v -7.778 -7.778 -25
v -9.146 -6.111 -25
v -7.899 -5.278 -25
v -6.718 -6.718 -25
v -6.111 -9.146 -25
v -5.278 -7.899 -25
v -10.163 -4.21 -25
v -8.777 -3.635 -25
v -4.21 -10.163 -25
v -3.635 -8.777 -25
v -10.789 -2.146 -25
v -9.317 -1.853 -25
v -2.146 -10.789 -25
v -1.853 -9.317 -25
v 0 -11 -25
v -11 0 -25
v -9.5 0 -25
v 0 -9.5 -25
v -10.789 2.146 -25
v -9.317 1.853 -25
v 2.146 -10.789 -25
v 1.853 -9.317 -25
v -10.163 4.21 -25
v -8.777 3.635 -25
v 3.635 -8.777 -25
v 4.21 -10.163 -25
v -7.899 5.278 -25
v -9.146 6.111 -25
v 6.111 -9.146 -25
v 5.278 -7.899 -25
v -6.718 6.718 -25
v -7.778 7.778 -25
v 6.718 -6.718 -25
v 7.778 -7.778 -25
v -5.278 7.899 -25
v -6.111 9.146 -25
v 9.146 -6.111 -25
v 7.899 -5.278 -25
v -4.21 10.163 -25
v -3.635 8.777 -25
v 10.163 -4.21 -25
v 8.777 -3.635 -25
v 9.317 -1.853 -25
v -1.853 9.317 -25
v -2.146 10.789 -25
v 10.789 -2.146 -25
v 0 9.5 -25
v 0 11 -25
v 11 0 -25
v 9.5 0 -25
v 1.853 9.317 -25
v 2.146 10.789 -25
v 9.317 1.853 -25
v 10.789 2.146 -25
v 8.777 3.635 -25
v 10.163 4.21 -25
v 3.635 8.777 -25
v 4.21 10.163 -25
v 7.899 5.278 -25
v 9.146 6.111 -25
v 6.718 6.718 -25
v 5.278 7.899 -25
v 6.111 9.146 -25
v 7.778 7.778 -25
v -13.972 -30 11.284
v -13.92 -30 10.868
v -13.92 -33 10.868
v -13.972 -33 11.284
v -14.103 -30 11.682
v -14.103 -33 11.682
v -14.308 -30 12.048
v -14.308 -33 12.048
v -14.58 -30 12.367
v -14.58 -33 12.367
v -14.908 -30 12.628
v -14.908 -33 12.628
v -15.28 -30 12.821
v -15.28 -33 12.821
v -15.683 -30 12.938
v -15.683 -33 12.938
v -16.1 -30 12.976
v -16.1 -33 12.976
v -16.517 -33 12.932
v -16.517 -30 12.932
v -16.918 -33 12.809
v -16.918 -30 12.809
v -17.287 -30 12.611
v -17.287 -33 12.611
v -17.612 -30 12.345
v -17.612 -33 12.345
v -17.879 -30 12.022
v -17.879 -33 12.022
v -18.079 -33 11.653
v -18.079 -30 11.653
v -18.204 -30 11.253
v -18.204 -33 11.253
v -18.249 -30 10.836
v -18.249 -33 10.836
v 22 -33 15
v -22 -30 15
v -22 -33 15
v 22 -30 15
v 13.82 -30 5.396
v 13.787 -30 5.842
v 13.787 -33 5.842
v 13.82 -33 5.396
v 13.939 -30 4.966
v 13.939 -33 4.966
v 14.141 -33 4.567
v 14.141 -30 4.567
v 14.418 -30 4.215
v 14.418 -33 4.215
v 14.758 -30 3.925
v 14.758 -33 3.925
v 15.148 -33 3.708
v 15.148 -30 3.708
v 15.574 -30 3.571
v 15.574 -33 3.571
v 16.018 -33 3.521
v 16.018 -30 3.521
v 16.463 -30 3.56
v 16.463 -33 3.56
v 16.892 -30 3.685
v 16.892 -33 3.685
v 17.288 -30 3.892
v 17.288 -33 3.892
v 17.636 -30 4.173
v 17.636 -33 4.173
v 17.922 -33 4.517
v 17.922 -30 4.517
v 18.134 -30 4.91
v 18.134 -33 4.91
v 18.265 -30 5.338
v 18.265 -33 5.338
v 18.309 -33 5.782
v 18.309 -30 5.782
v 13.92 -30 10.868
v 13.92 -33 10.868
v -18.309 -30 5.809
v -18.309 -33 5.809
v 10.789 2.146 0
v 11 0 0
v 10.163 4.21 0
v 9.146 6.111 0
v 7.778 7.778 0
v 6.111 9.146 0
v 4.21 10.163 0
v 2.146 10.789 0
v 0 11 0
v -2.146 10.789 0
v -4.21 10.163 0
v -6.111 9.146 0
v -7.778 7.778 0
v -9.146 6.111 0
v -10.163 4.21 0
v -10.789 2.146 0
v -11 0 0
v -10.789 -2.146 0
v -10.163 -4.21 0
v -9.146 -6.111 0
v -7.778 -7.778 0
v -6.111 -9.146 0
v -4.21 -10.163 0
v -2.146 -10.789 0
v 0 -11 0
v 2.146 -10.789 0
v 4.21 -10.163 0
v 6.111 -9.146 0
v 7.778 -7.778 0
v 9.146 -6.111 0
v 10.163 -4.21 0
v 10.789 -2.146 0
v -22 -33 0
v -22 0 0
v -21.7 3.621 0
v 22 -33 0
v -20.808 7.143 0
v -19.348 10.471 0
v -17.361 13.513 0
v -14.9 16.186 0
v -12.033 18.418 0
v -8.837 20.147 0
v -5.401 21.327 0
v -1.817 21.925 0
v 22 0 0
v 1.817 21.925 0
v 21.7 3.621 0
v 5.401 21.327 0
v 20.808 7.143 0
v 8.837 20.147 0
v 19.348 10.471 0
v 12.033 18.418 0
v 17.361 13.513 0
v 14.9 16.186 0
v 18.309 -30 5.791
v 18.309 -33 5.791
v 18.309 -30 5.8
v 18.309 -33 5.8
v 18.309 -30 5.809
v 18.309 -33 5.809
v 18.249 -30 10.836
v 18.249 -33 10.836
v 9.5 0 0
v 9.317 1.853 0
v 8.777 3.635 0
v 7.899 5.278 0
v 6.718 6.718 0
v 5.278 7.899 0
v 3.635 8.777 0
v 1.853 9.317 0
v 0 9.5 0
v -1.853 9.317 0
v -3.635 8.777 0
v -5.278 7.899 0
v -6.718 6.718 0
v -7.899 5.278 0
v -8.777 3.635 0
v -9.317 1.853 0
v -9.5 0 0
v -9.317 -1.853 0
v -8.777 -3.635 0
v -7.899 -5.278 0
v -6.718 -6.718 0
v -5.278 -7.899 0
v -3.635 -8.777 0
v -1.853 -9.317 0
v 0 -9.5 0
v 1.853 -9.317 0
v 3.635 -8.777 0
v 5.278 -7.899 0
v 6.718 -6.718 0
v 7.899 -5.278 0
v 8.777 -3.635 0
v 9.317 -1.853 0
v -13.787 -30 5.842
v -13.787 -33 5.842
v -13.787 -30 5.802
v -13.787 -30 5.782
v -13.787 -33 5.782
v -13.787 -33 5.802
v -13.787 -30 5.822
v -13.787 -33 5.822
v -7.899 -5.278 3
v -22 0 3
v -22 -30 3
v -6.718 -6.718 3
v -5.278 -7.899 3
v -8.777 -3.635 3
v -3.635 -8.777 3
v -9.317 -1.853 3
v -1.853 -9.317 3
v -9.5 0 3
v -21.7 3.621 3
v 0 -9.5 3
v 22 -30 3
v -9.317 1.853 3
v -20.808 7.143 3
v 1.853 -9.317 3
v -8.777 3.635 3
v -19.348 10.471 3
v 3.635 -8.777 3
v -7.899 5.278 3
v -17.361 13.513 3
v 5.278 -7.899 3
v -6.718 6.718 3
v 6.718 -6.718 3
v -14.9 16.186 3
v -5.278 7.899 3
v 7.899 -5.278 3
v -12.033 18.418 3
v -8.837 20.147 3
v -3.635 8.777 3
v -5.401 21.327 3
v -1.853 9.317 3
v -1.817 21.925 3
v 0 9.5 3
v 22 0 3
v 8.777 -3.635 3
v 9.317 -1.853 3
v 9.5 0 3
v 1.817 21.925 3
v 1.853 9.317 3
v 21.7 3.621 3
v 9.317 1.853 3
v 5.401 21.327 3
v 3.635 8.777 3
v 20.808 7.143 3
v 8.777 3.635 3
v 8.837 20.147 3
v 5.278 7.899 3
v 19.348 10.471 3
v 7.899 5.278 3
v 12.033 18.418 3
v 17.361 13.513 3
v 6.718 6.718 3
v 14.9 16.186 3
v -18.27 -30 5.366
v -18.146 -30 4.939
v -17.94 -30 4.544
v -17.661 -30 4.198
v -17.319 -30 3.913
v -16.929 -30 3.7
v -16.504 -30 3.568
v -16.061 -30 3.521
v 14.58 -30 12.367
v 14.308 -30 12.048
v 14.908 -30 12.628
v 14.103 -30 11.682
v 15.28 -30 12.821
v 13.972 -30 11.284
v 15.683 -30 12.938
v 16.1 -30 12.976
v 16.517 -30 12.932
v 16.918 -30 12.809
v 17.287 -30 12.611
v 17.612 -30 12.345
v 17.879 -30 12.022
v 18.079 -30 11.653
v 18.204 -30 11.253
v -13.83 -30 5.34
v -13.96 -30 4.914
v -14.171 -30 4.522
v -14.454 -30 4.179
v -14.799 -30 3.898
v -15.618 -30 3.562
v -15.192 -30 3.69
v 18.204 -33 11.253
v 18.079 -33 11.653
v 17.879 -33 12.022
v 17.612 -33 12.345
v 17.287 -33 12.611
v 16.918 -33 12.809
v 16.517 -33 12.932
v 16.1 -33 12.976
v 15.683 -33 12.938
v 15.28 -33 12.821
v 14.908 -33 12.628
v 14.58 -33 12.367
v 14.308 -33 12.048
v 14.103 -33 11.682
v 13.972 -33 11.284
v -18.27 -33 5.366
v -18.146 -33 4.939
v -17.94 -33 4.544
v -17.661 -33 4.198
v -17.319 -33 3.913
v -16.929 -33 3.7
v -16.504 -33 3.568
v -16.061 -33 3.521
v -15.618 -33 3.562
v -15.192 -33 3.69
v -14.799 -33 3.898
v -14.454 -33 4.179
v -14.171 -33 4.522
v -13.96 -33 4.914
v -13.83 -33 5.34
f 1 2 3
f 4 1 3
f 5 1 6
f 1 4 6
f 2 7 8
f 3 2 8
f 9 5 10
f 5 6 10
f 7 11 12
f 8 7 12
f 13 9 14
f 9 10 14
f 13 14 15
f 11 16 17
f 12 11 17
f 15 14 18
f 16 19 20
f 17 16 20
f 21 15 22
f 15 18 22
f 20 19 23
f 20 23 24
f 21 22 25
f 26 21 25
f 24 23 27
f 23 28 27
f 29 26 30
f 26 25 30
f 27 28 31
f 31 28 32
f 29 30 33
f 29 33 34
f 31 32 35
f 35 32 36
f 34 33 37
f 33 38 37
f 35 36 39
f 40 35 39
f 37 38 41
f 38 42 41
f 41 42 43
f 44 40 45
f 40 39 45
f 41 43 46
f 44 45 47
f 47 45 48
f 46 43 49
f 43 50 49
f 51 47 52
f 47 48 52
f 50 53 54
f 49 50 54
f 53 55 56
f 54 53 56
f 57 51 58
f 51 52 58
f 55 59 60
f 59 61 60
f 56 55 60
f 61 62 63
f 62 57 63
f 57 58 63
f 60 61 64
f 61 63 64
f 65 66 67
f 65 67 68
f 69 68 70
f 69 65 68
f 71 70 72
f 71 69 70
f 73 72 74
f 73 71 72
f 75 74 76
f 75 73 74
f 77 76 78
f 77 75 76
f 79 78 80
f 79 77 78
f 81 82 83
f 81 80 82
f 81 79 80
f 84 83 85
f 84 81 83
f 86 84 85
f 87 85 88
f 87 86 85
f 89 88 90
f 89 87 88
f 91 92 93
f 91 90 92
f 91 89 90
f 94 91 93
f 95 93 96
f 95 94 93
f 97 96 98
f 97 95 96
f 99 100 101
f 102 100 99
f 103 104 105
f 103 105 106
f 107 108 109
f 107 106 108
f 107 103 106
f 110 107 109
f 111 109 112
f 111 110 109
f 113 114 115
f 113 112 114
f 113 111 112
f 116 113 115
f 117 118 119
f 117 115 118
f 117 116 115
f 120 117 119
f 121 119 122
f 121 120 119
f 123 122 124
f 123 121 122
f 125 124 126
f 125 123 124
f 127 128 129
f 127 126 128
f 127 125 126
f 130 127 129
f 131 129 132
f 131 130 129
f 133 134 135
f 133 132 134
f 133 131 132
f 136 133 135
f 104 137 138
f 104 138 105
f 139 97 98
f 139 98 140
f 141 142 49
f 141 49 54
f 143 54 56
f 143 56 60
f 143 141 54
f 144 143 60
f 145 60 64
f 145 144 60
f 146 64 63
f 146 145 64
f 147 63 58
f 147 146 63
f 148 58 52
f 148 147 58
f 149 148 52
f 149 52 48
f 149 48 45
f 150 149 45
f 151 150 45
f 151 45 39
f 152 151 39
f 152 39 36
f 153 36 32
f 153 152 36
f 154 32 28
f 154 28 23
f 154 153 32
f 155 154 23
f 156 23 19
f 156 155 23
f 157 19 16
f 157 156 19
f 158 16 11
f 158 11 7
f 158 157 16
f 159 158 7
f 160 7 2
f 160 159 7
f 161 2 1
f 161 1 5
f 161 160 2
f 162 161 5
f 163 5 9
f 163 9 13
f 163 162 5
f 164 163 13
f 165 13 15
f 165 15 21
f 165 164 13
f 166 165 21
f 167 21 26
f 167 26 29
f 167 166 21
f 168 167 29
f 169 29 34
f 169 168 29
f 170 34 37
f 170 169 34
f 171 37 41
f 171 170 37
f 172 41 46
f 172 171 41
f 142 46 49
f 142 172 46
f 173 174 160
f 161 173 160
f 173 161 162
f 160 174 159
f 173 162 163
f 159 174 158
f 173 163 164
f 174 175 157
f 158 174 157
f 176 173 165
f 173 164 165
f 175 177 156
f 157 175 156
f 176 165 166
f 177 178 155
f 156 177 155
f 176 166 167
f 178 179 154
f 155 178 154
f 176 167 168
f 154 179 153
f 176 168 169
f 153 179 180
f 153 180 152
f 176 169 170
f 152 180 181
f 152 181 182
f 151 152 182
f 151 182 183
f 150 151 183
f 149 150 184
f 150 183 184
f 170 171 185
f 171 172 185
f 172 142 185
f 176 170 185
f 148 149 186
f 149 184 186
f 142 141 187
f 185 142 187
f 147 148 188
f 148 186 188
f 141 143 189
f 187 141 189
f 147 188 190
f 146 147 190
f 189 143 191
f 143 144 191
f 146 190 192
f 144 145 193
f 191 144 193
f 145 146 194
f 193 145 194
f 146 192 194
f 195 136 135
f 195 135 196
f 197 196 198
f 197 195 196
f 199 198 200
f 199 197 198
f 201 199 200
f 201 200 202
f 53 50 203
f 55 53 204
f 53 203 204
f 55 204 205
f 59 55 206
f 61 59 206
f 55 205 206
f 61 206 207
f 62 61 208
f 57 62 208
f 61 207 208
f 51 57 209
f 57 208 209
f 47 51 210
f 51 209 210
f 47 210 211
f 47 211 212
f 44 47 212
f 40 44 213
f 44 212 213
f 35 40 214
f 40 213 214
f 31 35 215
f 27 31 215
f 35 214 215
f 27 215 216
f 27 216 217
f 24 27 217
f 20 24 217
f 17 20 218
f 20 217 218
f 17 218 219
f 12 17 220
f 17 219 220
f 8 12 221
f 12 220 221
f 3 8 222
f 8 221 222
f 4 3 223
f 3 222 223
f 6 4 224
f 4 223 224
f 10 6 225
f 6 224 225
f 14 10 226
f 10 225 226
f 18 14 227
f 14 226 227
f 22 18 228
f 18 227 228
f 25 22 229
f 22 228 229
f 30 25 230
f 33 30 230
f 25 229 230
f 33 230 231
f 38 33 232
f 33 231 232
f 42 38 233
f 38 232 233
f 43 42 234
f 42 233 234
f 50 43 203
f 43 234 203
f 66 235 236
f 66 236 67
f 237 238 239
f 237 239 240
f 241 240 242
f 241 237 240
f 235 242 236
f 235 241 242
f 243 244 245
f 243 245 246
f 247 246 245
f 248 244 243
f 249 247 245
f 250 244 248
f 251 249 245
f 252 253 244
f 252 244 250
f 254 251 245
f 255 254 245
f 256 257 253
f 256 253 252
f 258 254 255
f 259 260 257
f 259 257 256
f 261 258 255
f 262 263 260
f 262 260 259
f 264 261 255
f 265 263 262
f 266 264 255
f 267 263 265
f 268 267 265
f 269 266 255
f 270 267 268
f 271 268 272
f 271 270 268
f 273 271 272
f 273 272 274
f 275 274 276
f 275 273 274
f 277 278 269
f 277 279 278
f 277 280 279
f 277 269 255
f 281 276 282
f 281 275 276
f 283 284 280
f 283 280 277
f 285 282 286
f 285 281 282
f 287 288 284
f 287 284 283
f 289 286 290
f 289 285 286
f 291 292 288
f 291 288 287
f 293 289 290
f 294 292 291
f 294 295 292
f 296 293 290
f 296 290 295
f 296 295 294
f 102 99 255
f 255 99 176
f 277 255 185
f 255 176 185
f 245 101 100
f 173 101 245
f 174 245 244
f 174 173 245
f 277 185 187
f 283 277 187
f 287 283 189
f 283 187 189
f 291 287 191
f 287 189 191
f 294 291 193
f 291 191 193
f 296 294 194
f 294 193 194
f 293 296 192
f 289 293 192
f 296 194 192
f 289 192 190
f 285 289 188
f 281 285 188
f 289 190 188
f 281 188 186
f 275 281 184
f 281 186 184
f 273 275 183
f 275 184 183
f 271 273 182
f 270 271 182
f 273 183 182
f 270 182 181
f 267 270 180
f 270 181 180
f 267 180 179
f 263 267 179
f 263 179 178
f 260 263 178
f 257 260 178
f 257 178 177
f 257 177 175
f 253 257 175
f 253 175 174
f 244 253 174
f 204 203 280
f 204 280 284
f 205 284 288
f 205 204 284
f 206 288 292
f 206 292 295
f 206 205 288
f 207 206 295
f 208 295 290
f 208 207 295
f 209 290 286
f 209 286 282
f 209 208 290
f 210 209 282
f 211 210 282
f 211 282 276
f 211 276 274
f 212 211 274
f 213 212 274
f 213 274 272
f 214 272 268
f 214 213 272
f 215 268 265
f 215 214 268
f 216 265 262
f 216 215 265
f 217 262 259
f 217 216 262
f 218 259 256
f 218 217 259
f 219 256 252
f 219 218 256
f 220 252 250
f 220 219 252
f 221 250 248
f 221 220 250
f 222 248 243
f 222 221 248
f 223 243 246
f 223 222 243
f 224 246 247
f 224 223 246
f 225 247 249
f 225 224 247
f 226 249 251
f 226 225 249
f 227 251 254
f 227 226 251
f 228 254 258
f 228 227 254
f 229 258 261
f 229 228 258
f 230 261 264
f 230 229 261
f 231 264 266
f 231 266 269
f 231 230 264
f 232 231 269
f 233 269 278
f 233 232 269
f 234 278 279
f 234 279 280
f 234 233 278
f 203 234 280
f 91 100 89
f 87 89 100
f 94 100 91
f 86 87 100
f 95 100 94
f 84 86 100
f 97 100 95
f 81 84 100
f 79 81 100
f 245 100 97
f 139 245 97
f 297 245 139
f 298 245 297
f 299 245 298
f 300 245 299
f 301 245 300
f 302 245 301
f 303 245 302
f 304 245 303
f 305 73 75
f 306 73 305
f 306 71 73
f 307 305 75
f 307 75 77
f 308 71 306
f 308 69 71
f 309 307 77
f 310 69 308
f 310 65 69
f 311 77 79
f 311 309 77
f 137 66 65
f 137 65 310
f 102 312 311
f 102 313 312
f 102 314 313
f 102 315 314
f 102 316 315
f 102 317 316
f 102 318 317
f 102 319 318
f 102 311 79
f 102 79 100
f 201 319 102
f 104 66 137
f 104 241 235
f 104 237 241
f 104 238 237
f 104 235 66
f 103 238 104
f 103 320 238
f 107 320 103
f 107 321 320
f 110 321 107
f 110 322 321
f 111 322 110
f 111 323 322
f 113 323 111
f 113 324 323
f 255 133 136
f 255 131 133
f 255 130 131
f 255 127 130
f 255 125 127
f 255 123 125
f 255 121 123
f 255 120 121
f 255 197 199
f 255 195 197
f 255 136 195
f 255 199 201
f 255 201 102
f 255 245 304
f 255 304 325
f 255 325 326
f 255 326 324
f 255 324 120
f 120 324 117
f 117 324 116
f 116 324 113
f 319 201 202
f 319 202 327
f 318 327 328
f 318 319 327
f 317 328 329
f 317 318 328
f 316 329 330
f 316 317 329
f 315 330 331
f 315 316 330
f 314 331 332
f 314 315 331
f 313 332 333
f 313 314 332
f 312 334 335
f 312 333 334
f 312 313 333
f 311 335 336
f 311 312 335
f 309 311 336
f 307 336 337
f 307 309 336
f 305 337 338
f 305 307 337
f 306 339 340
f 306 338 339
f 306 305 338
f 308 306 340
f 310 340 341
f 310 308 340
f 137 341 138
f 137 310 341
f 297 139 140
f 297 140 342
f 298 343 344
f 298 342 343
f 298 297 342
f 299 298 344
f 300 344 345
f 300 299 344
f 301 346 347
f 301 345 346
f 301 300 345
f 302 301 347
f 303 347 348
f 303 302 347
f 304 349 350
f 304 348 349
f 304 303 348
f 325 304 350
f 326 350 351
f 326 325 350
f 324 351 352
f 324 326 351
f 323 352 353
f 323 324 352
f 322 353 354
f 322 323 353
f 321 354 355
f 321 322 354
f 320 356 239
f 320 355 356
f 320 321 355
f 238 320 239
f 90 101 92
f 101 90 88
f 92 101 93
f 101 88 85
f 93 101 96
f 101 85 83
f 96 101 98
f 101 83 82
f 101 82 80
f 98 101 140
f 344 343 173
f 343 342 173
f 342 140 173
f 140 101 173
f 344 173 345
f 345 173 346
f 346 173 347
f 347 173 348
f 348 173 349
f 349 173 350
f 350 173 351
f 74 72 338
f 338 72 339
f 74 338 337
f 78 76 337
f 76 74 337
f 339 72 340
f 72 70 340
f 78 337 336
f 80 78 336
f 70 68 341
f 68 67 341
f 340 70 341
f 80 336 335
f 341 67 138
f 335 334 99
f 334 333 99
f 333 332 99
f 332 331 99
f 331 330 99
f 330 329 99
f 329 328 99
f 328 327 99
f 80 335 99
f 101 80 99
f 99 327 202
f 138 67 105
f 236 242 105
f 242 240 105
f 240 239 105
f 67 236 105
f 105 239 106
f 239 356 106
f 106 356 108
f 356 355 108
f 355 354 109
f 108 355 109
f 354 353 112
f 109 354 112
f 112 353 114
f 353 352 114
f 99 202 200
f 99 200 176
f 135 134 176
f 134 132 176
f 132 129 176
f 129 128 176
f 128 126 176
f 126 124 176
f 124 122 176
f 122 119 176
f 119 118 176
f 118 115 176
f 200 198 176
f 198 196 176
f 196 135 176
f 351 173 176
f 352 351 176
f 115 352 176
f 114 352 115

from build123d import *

# Parameters (mm, degrees)
F0_R     = 11
F0_R_2   = 9.5
F1_DEPTH = 3
F0_W     = 44
F0_H     = 3
F2_DEPTH = 15
F3_DEPTH = 25
F5_DEPTH = 50


with BuildPart() as f1:
    # F0 (on Top) → F1 (new body)
    with BuildSketch(Plane.XY):
        with BuildLine():
            Line((22, -30), (22, 0))
            ThreePointArc((22, 0), (0, -22), (-22, 0))
            Line((-22, 0), (-22, -30))
            Line((-22, -30), (22, -30))
        make_face()
        with BuildLine():
            ThreePointArc((-22, 0), (0, -22), (22, 0))
            ThreePointArc((22, 0), (0, 22), (-22, 0))
        make_face()
        Circle(F0_R, mode=Mode.SUBTRACT)
        Circle(F0_R)
        Circle(F0_R_2, mode=Mode.SUBTRACT)
    extrude(amount=F1_DEPTH)

    # F0 (on Top) → F2 (join)
    with BuildSketch(Plane.XY):
        with Locations((0, -31.5)):
            Rectangle(F0_W, F0_H)
    extrude(amount=F2_DEPTH)

    # F0 (on Top) → F3 (join)
    with BuildSketch(Plane.XY):
        Circle(F0_R)
        Circle(F0_R_2, mode=Mode.SUBTRACT)
    extrude(amount=-F3_DEPTH)

    # F4 (on Front) → F5 (cut)
    with BuildSketch(Plane.XZ):
        with BuildLine():
            ThreePointArc((-18.249251, 10.8364), (-16.097239, 8.645825), (-13.919441, 10.810768))
            ThreePointArc((-13.919441, 10.810768), (-13.91963, 10.839348), (-13.920196, 10.867923))
            ThreePointArc((-13.920196, 10.867923), (-16.100186, 12.975691), (-18.249251, 10.8364))
        make_face()
        with BuildLine():
            ThreePointArc((-13.920196, 10.867923), (-13.91963, 10.839348), (-13.919441, 10.810768))
            ThreePointArc((-13.919441, 10.810768), (-16.097239, 8.645825), (-18.249251, 10.8364))
            Line((-18.249251, 10.8364), (-18.308776, 5.809141))
            ThreePointArc((-18.308776, 5.809141), (-16.064272, 8.043438), (-13.787468, 5.842063))
            Line((-13.787468, 5.842063), (-13.920196, 10.867923))
        make_face()
        with BuildLine():
            ThreePointArc((-13.78668, 5.78237), (-13.786877, 5.812219), (-13.787468, 5.842063))
            ThreePointArc((-13.787468, 5.842063), (-16.064272, 8.043438), (-18.308776, 5.809141))
            ThreePointArc((-18.308776, 5.809141), (-16.061193, 3.521282), (-13.78668, 5.78237))
        make_face()
        with BuildLine():
            ThreePointArc((18.249403, 10.810768), (16.055842, 8.645976), (13.920196, 10.867923))
            Line((13.920196, 10.867923), (13.787468, 5.842063))
            ThreePointArc((13.787468, 5.842063), (16.064272, 8.043438), (18.308776, 5.809141))
            Line((18.308776, 5.809141), (18.249251, 10.8364))
            ThreePointArc((18.249251, 10.8364), (18.249365, 10.823584), (18.249403, 10.810768))
        make_face()
        with BuildLine():
            ThreePointArc((18.249251, 10.8364), (16.100186, 12.975691), (13.920196, 10.867923))
            ThreePointArc((13.920196, 10.867923), (16.055842, 8.645976), (18.249403, 10.810768))
            ThreePointArc((18.249403, 10.810768), (18.249365, 10.823584), (18.249251, 10.8364))
        make_face()
        with BuildLine():
            ThreePointArc((18.308776, 5.809141), (16.064272, 8.043438), (13.787468, 5.842063))
            ThreePointArc((13.787468, 5.842063), (16.017958, 3.52144), (18.308935, 5.78237))
            ThreePointArc((18.308935, 5.78237), (18.308895, 5.795756), (18.308776, 5.809141))
        make_face()
    extrude(amount=F5_DEPTH, mode=Mode.SUBTRACT)


solid = f1.part
